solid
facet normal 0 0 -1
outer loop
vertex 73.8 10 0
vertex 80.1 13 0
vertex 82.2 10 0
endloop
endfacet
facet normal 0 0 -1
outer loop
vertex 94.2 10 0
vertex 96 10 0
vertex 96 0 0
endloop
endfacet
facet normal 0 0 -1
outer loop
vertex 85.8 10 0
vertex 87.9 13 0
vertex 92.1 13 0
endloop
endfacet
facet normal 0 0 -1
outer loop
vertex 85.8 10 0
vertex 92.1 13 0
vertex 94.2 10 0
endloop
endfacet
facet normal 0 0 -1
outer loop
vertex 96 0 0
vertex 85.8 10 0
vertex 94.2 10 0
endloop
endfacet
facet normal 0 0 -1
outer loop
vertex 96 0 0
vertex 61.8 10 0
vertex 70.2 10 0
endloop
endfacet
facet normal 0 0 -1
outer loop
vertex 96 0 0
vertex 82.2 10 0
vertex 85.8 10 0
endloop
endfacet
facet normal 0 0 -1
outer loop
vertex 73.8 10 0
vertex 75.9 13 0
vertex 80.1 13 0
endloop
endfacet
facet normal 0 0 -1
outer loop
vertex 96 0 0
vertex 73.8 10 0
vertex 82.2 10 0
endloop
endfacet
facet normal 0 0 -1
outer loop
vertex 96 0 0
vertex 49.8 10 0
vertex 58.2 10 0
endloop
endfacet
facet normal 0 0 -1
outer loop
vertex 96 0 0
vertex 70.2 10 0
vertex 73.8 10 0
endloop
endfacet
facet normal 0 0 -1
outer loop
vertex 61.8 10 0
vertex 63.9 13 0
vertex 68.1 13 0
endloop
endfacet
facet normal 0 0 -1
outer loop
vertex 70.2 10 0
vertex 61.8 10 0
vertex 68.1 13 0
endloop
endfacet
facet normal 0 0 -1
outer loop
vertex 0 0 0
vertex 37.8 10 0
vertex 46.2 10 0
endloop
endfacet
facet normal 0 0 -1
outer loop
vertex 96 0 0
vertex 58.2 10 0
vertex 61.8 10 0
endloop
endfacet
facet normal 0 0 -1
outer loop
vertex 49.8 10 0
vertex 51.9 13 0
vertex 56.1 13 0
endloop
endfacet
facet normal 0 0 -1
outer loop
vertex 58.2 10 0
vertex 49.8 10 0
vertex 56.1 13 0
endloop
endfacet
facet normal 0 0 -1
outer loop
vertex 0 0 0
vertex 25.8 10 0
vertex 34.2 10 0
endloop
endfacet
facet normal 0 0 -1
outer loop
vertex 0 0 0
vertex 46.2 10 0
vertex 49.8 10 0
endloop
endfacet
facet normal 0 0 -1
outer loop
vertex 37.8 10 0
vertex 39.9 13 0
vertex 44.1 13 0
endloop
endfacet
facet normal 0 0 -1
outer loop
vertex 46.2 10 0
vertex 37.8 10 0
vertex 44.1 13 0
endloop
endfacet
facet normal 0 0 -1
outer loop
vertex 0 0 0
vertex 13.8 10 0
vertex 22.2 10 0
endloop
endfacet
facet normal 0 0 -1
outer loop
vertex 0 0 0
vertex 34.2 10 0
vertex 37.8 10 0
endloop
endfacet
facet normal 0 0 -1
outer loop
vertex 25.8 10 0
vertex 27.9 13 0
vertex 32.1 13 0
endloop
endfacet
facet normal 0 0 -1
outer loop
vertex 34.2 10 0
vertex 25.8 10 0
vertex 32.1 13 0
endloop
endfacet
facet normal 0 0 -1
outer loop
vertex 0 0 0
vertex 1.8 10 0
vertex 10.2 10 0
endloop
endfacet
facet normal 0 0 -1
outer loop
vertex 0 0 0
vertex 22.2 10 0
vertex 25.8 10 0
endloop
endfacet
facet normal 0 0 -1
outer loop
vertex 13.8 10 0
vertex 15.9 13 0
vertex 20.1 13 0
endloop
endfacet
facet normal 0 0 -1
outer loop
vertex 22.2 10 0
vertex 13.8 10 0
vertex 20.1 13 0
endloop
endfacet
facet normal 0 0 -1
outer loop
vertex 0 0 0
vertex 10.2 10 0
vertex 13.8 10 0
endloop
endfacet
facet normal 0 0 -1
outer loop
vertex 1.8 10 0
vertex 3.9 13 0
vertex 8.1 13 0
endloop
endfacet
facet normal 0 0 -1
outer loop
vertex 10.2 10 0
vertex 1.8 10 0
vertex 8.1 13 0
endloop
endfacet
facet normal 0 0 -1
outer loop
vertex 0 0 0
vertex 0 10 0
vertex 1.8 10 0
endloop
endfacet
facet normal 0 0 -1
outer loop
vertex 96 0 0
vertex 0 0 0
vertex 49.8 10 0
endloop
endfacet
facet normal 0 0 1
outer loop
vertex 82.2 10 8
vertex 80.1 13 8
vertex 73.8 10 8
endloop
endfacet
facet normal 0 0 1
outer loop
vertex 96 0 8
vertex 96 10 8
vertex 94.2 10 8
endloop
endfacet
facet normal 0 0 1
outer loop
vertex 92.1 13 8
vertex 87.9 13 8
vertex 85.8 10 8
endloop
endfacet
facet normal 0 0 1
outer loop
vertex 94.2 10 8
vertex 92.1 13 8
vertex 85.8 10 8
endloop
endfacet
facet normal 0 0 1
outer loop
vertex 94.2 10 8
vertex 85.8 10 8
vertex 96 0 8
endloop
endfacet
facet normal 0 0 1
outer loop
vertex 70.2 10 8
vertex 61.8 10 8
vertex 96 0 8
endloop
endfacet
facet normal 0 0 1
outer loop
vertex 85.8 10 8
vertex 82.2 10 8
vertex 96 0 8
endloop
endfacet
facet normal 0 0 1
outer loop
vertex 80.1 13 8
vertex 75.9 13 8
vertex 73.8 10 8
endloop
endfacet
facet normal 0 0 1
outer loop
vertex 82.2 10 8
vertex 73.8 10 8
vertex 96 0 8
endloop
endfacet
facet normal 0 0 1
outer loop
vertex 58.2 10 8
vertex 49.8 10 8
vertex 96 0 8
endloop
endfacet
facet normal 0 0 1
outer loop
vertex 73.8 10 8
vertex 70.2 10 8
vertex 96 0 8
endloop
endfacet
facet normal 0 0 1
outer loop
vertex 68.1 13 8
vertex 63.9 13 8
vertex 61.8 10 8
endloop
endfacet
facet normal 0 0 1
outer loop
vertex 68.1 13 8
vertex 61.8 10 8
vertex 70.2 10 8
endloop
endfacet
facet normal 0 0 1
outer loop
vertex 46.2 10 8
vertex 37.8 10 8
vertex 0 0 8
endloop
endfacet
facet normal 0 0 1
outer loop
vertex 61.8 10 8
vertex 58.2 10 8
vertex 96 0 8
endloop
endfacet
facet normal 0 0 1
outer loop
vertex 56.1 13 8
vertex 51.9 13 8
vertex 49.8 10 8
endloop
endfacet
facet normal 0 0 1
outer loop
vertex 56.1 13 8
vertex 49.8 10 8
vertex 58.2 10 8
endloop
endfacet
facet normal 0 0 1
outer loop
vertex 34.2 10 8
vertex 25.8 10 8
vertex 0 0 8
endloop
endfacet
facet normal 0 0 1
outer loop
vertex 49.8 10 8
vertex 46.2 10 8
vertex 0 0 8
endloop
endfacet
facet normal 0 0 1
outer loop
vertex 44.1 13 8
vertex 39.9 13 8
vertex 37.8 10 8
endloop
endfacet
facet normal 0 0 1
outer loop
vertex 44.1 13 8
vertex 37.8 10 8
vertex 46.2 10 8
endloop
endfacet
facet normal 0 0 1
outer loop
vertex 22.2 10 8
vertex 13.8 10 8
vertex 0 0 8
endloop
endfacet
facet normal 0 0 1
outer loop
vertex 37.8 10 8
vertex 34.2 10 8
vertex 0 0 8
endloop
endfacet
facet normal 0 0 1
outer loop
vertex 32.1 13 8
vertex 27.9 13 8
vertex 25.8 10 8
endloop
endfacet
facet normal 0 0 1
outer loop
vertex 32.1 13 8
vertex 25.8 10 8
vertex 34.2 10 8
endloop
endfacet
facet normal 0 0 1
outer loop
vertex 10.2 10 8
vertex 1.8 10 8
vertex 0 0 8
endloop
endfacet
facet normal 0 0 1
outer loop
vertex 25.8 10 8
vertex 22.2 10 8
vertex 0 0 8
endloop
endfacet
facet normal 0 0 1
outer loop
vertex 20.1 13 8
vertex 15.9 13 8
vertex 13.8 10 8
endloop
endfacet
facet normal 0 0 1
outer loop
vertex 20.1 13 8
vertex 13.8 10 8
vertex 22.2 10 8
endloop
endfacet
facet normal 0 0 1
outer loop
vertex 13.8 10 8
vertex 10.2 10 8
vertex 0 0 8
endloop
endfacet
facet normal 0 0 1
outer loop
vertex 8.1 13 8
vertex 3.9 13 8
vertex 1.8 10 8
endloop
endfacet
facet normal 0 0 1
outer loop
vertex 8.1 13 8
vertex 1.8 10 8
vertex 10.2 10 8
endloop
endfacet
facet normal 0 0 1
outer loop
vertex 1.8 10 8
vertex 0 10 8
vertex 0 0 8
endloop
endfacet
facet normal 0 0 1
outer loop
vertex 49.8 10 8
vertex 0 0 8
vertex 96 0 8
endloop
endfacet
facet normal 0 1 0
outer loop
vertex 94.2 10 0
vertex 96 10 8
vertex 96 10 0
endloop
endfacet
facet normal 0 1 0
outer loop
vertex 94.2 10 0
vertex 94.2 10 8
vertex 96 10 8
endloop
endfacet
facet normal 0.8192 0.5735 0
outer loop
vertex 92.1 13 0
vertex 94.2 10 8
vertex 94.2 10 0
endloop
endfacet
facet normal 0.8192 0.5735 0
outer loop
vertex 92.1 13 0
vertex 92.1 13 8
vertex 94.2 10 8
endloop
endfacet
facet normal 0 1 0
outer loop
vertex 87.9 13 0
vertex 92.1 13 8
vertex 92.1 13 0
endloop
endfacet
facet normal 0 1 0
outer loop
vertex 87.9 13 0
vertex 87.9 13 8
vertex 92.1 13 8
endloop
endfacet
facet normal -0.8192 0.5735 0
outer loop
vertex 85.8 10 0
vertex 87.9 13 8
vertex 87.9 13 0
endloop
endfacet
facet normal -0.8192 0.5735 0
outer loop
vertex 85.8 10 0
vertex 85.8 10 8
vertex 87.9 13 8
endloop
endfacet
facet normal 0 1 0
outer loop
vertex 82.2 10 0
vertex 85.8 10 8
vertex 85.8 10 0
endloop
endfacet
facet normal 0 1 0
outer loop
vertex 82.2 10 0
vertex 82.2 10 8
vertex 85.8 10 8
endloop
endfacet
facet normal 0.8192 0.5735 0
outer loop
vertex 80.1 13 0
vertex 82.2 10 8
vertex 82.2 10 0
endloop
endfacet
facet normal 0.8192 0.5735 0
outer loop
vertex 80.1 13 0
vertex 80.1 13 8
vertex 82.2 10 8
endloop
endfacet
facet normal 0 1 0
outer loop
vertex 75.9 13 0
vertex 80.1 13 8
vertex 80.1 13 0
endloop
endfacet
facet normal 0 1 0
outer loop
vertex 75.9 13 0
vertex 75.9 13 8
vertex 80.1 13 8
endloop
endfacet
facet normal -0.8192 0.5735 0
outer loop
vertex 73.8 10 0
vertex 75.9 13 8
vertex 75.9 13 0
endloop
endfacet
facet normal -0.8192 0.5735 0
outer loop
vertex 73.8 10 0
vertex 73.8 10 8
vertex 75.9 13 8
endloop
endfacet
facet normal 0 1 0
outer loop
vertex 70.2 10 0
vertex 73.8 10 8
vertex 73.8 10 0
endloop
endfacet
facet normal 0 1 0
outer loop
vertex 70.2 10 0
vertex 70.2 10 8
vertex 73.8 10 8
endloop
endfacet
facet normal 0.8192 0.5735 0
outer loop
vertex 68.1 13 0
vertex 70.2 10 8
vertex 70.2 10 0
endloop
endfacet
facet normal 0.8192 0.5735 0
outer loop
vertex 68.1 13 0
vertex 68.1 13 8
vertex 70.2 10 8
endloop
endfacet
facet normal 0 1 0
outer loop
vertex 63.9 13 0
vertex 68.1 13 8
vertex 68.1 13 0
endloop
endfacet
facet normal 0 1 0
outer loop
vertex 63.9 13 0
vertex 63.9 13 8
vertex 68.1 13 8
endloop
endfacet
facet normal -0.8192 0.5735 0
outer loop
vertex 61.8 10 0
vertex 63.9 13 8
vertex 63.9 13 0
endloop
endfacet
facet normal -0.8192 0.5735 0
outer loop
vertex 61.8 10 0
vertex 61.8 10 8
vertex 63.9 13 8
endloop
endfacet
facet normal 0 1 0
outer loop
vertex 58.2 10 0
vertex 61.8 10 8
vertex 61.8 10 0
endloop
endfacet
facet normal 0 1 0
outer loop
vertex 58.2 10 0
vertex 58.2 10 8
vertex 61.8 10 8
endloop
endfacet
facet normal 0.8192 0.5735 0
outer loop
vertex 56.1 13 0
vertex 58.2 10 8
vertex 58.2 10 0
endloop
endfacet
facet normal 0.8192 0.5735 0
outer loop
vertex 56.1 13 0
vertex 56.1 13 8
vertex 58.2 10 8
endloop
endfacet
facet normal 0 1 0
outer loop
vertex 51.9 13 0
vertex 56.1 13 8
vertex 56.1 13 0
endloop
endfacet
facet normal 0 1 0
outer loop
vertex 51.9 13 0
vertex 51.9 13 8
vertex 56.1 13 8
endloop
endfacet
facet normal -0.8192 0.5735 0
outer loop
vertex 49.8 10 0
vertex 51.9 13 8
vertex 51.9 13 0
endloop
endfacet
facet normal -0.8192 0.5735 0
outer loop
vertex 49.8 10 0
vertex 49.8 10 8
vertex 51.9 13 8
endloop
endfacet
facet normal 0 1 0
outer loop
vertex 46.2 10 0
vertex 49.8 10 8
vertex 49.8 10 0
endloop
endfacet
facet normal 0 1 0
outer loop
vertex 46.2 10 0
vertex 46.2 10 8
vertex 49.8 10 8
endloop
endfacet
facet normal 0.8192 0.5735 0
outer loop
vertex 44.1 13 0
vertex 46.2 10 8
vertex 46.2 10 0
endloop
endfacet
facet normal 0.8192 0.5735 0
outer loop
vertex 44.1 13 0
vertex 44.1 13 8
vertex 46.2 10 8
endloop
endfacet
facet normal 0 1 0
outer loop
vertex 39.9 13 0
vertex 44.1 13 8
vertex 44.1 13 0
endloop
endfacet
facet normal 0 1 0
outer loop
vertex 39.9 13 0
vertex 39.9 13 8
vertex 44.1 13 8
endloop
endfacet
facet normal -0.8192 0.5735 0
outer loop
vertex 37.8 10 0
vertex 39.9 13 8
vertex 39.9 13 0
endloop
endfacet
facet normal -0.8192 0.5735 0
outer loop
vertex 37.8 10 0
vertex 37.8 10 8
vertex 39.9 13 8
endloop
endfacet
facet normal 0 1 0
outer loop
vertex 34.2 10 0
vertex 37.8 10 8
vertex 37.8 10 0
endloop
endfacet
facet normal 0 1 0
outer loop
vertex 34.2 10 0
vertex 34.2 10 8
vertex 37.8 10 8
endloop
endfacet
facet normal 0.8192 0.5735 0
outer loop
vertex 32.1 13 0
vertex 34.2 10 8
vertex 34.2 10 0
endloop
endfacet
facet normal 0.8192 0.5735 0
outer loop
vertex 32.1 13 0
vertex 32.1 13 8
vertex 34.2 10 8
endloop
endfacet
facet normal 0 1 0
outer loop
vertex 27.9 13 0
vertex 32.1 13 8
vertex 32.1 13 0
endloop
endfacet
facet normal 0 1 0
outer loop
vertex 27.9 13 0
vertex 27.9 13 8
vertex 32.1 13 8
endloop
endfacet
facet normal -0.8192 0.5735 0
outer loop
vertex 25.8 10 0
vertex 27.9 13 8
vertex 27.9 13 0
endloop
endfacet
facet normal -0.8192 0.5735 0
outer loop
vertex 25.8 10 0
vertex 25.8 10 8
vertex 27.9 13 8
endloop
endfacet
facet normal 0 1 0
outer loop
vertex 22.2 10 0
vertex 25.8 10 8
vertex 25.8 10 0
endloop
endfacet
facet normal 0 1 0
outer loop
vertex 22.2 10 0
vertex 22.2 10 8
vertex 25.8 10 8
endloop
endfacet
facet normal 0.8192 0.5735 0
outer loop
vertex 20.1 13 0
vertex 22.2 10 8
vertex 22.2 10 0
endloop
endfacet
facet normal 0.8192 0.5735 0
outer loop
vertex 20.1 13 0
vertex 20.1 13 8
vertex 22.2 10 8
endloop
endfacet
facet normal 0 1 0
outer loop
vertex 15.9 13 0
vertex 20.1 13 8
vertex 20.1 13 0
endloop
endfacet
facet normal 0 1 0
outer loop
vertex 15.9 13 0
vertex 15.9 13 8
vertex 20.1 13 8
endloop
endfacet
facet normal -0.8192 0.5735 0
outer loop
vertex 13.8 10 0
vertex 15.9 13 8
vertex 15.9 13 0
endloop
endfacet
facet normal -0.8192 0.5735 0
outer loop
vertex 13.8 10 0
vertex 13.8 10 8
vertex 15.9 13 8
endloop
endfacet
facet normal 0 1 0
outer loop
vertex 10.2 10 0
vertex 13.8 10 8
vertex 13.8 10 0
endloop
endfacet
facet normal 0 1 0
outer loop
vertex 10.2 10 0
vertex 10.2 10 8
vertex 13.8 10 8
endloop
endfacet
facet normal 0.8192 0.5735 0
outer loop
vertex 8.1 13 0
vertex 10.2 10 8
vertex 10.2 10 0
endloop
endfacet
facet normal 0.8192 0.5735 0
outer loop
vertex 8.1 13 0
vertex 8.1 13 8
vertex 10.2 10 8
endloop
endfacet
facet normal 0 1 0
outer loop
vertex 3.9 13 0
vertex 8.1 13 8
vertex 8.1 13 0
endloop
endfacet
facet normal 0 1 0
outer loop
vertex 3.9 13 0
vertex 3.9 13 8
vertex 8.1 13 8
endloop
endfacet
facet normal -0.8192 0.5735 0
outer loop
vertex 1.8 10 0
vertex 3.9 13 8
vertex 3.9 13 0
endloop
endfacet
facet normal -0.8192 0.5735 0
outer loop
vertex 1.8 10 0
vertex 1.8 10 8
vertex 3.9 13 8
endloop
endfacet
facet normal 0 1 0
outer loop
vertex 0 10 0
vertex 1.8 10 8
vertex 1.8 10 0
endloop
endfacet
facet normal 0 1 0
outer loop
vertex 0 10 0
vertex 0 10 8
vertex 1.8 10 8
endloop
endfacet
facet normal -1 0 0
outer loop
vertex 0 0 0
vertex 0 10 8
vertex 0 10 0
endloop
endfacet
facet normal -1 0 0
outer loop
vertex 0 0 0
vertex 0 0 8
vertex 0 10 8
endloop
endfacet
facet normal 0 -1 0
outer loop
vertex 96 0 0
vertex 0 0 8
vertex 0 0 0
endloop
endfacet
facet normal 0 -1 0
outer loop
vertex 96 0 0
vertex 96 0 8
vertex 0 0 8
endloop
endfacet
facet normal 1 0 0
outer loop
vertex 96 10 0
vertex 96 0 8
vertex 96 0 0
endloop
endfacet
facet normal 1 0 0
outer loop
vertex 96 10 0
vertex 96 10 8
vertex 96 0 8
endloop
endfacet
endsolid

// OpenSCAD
$fn = 32;

// ----------------------------------------------------------------------
// Gear rack: 8 teeth, pitch 12 mm
// ----------------------------------------------------------------------

// --- parameters (mm) ---
teeth = 8;                // number of teeth
pitch = 12;               // tooth pitch, X
root_w = 8.4;             // tooth width at the root
tip_w = 4.2;              // tooth width at the tip
base_h = 10;              // rack body height, Y
tooth_h = 3;              // tooth height above the body
plate_t = 8;              // rack width, Z (extrusion height)

rack_l = teeth * pitch;  // overall length
total_h = base_h + tooth_h;  // overall height

profile = [[0, 0], [96, 0], [96, 10], [94.2, 10], [92.1, 13], [87.9, 13], [85.8, 10], [82.2, 10], [80.1, 13], [75.9, 13], [73.8, 10], [70.2, 10], [68.1, 13], [63.9, 13], [61.8, 10], [58.2, 10], [56.1, 13], [51.9, 13], [49.8, 10], [46.2, 10], [44.1, 13], [39.9, 13], [37.8, 10], [34.2, 10], [32.1, 13], [27.9, 13], [25.8, 10], [22.2, 10], [20.1, 13], [15.9, 13], [13.8, 10], [10.2, 10], [8.1, 13], [3.9, 13], [1.8, 10], [0, 10]];  // primary outline, 36 points, counter clockwise

// --- the one profile operation ---
linear_extrude(height = plate_t) polygon(points = profile);
